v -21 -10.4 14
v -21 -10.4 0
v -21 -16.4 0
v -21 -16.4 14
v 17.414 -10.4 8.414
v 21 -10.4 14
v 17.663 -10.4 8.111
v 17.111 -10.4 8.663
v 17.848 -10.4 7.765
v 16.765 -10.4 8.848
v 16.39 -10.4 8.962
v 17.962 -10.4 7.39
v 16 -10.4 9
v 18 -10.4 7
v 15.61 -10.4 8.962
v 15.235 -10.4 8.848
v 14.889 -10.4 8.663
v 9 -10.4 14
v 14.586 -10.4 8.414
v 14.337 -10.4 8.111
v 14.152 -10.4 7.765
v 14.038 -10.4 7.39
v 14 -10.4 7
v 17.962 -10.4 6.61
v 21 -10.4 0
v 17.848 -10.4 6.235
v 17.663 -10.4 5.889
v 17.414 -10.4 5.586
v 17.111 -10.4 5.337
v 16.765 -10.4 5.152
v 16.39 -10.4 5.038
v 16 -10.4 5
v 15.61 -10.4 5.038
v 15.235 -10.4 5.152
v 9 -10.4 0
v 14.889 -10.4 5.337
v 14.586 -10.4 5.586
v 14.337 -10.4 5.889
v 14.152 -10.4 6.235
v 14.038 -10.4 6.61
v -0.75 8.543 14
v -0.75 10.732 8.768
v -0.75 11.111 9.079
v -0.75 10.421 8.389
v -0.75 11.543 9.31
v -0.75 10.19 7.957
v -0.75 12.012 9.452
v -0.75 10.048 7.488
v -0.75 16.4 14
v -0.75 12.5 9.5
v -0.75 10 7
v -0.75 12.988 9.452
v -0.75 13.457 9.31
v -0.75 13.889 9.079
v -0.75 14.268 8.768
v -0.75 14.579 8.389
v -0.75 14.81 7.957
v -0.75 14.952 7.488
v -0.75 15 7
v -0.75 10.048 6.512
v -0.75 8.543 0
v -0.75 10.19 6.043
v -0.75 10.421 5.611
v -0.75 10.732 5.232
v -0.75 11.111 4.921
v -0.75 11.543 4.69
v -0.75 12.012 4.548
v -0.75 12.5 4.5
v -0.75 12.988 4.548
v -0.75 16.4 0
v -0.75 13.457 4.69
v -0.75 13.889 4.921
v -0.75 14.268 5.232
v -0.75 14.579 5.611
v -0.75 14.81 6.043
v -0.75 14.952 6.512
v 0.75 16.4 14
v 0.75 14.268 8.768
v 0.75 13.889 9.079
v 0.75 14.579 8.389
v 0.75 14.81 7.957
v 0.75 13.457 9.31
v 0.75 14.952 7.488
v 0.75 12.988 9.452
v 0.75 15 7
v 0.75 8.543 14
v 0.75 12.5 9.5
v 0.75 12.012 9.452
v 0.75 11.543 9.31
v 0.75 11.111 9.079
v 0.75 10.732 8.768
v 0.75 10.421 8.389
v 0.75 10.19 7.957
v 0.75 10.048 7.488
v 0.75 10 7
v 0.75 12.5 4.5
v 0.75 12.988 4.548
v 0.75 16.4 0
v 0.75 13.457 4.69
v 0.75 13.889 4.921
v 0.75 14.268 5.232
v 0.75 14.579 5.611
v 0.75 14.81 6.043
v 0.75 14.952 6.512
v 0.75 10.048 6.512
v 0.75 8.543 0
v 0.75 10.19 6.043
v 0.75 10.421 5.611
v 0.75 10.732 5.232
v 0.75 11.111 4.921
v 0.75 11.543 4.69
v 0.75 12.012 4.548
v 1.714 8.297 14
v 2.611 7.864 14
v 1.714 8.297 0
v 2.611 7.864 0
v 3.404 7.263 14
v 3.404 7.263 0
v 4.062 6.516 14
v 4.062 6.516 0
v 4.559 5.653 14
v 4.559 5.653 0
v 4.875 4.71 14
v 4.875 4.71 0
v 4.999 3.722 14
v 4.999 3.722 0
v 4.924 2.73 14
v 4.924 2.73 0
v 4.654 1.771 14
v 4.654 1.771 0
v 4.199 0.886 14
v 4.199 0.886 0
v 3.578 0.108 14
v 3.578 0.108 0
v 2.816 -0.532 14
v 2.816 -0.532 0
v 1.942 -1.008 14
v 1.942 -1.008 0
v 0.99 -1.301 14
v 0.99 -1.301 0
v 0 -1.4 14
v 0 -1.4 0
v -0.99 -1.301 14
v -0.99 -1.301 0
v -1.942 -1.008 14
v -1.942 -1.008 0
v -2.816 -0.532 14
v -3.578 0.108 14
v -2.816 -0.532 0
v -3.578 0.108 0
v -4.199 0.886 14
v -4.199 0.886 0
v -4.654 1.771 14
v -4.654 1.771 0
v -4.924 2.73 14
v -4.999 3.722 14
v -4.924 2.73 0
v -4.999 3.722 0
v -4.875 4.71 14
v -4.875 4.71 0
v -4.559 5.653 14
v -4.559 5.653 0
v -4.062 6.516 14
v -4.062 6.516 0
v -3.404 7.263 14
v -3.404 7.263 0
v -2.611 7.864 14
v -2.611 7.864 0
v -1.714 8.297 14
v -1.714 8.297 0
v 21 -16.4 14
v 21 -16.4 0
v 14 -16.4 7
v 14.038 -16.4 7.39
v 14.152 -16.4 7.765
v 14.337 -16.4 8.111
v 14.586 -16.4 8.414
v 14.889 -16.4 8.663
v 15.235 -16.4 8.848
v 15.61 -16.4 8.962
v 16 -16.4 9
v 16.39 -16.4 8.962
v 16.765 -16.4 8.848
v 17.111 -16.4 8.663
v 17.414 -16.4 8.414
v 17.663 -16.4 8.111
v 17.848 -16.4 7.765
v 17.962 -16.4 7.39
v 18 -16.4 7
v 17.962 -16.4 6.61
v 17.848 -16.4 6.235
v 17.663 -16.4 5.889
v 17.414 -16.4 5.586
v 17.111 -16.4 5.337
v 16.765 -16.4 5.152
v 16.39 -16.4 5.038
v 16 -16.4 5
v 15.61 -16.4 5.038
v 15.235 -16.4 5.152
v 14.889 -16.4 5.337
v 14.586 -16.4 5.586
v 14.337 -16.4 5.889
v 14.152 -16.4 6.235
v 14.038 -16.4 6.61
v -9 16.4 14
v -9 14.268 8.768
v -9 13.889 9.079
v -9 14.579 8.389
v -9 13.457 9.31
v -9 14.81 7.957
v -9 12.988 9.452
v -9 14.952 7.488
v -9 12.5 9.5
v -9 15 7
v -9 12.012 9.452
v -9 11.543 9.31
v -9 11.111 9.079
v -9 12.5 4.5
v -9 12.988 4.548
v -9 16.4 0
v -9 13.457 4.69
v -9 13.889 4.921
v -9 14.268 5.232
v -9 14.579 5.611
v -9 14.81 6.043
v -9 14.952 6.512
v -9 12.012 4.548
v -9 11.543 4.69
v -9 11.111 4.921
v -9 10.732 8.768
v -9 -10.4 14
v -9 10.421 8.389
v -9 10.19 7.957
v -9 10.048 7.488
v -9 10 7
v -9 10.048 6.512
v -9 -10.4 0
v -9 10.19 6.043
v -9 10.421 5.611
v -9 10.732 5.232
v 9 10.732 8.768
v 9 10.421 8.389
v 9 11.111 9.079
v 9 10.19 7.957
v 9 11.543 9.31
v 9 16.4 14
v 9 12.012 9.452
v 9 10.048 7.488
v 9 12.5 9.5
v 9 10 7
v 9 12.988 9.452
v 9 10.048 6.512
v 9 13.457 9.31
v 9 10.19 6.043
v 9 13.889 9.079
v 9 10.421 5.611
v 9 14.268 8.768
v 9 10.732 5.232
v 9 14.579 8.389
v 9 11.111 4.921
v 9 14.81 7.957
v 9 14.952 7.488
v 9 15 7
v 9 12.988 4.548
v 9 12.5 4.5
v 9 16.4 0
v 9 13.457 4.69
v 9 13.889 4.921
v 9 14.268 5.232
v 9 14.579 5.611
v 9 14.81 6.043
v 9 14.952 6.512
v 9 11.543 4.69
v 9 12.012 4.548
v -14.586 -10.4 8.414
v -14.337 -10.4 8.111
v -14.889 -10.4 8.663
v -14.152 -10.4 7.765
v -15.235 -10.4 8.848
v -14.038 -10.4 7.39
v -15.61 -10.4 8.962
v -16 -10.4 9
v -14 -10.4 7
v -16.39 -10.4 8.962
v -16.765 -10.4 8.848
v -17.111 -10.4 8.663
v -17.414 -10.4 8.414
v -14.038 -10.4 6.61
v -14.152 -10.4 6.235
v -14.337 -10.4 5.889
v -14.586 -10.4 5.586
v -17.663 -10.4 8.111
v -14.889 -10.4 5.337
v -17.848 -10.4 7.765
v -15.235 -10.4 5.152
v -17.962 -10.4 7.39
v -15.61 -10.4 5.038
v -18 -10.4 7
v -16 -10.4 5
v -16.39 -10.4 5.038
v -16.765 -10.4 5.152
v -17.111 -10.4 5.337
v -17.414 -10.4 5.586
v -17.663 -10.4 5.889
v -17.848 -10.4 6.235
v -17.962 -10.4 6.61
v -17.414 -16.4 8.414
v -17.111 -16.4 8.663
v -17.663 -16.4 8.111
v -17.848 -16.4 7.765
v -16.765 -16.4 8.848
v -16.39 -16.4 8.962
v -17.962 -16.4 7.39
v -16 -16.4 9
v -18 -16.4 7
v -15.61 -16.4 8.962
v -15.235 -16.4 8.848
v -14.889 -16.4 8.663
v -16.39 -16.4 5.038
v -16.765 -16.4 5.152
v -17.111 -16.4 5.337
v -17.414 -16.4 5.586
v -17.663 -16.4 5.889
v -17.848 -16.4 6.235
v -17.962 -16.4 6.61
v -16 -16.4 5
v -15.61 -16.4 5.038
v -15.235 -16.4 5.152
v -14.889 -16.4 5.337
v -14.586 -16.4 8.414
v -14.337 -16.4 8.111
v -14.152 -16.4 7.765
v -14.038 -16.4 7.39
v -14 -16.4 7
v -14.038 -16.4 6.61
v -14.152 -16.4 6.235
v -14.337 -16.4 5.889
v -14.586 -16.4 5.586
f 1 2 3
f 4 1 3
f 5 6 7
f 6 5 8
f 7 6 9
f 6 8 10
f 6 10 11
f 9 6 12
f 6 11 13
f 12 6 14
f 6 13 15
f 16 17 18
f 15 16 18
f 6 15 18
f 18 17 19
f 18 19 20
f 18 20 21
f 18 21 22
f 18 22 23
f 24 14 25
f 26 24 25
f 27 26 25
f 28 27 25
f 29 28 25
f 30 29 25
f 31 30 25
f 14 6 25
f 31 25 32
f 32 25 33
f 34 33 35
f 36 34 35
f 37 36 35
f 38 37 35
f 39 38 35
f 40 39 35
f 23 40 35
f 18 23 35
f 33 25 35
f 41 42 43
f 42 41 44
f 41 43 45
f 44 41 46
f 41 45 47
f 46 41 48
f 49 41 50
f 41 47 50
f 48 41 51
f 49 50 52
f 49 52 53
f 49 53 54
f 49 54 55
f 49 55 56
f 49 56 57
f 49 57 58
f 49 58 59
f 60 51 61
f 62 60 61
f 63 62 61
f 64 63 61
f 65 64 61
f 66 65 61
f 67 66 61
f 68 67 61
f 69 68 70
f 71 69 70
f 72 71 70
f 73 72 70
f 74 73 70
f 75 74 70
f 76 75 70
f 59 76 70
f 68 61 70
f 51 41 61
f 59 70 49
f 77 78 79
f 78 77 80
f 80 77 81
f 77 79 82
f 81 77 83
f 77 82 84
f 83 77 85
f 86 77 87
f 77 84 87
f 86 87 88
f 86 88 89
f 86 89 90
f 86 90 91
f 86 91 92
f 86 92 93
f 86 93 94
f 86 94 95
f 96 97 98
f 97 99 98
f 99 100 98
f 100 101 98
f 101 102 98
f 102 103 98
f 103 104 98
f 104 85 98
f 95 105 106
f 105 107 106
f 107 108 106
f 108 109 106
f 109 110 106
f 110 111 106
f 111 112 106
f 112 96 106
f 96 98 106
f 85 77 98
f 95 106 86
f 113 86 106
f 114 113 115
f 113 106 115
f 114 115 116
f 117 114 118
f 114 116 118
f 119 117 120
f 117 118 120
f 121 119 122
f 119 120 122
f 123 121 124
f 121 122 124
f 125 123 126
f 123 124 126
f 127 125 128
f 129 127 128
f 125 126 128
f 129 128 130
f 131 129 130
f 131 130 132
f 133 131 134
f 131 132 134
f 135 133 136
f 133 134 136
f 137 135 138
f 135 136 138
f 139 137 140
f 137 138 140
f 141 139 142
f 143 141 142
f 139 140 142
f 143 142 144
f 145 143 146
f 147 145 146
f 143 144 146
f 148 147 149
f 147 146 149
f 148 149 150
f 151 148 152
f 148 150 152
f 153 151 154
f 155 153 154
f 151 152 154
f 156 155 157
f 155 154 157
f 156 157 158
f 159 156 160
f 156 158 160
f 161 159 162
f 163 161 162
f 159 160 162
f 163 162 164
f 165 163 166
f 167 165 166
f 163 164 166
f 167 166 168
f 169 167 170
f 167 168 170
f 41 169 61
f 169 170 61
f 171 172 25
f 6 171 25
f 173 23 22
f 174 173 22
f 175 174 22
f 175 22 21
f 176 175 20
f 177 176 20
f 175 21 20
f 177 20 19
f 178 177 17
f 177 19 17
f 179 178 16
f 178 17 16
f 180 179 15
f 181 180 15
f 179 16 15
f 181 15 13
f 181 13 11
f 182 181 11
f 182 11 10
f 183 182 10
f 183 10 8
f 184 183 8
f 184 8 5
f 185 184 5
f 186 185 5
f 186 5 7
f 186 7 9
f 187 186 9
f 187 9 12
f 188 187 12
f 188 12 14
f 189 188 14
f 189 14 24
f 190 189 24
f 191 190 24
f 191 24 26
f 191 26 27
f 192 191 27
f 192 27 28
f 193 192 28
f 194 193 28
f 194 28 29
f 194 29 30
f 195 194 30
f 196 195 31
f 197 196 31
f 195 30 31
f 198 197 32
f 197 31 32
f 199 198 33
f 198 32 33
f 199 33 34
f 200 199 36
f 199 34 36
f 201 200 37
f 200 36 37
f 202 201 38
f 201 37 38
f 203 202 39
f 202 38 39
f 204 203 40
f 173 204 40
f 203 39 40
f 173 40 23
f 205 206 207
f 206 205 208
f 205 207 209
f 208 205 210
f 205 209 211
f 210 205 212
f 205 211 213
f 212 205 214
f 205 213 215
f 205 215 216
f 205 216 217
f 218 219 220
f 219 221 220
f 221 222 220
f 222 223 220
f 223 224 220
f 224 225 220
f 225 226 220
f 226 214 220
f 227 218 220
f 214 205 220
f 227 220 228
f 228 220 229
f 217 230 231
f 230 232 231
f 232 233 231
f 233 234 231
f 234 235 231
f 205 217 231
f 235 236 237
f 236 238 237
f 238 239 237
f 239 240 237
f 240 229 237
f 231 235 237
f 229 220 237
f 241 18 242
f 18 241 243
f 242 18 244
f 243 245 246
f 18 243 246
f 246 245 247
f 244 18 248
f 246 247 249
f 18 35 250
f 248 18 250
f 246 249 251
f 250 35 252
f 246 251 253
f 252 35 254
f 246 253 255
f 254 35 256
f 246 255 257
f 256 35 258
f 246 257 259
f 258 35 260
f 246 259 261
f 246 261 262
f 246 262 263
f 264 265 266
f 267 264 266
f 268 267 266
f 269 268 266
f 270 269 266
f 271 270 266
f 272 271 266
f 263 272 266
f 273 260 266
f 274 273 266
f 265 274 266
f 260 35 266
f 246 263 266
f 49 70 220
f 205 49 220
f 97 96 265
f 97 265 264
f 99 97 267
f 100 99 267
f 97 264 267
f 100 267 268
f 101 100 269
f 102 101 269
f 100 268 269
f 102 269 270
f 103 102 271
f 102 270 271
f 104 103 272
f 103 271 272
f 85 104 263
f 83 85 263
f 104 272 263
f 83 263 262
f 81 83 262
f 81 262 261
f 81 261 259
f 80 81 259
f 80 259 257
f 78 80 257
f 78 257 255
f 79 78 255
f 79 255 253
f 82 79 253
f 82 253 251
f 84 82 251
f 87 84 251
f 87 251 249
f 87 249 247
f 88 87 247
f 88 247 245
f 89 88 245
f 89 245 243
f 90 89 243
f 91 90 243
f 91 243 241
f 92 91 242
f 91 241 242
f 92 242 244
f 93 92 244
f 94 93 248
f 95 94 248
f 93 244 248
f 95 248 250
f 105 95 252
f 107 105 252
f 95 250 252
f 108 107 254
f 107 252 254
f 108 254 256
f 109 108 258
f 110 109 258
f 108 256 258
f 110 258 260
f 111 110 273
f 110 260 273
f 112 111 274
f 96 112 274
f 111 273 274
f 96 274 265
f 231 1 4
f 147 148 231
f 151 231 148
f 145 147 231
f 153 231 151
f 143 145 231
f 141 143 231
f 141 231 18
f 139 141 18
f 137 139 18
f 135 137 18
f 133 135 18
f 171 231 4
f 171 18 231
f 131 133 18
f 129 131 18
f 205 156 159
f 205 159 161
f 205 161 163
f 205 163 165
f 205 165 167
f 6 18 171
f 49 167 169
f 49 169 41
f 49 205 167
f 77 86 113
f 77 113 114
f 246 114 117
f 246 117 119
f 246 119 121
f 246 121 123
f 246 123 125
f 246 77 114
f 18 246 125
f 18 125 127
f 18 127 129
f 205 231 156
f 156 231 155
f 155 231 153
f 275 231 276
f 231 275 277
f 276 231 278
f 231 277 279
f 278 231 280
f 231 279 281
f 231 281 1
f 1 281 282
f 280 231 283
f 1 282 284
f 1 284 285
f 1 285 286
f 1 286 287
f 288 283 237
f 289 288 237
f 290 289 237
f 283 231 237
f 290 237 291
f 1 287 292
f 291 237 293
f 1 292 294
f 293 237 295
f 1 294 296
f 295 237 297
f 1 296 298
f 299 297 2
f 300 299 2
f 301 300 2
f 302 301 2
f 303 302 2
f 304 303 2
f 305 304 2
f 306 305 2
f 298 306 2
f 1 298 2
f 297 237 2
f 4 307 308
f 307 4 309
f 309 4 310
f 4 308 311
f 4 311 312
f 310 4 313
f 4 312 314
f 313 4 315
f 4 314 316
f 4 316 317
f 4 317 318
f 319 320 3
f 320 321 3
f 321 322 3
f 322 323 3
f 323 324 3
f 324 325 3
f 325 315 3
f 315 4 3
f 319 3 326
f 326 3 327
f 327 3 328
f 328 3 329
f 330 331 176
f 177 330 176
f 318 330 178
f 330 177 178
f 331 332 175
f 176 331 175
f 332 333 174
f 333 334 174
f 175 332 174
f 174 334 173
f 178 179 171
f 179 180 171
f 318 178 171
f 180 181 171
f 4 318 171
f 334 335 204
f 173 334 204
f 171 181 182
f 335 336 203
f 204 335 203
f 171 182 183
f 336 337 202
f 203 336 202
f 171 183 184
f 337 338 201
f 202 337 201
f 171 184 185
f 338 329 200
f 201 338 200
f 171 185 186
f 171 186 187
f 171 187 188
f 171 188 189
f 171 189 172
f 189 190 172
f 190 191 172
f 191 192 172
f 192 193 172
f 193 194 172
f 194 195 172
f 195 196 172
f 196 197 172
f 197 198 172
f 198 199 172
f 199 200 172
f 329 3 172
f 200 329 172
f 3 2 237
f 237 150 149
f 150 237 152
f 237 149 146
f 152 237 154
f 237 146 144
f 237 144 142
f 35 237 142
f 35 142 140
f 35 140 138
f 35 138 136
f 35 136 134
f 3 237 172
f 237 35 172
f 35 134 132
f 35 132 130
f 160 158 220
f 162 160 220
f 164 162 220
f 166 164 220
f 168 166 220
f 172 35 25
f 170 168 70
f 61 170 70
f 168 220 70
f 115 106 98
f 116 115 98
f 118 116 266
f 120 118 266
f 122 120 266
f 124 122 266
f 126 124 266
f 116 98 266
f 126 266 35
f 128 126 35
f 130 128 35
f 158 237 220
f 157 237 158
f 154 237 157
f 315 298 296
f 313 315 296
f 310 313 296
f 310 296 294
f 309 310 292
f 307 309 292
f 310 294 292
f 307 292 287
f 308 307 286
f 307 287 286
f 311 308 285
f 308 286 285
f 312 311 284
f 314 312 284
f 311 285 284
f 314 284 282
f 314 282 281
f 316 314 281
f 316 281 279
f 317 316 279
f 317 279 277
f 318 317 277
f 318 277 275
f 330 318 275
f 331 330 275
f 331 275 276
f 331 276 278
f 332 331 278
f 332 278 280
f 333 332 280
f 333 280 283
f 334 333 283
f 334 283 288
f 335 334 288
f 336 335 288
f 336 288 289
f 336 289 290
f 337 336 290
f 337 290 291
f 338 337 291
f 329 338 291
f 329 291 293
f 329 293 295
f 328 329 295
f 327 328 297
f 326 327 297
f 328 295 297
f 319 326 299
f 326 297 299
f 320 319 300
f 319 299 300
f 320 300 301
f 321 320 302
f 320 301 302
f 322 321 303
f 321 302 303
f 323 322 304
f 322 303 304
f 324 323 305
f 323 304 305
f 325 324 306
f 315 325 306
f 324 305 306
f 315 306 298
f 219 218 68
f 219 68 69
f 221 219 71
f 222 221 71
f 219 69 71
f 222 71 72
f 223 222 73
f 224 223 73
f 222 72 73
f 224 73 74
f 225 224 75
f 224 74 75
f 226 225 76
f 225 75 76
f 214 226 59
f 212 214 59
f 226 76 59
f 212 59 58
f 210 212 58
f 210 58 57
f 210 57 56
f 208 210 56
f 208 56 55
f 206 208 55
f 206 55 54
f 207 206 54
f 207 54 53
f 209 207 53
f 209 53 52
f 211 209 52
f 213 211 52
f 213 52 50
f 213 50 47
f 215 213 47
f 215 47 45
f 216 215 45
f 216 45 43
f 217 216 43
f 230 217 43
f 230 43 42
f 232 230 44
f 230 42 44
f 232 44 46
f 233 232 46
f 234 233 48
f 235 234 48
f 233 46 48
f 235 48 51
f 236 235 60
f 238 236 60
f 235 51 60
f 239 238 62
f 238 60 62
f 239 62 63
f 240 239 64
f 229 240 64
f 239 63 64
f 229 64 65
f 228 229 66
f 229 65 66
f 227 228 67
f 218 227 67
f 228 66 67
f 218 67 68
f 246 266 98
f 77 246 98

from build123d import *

# Parameters (mm, degrees)
BOSS_EXTRUDE1_DEPTH = 14
SKETCH2_R           = 2.5
CUT_EXTRUDE1_DEPTH  = 37.945365068
SKETCH3_R           = 2
CUT_EXTRUDE2_DEPTH  = 14


with BuildPart() as part:
    # Sketch1 → Boss-Extrude1 (new body)
    with BuildSketch(Plane.XY):
        with BuildLine():
            Line((-21, -16.4), (21, -16.4))
            Line((21, -16.4), (21, -10.4))
            Line((21, -10.4), (9, -10.4))
            Line((9, -10.4), (9, 16.4))
            Line((9, 16.4), (0.75, 16.4))
            Line((0.75, 16.4), (0.75, 8.543429983))
            ThreePointArc((0.75, 8.543429983), (0, -1.4), (-0.75, 8.543429983))
            Line((-0.75, 8.543429983), (-0.75, 16.4))
            Line((-0.75, 16.4), (-9, 16.4))
            Line((-9, 16.4), (-9, -10.4))
            Line((-9, -10.4), (-21, -10.4))
            Line((-21, -10.4), (-21, -16.4))
        make_face()
    extrude(amount=BOSS_EXTRUDE1_DEPTH)

    # Sketch2 → Cut-Extrude1 (cut, through all)
    with BuildSketch(Plane(origin=(9, 0, 0), x_dir=(0, 0, -1), z_dir=(1, 0, 0))):
        with Locations((-7, 12.5)):
            Circle(SKETCH2_R)
    extrude(amount=-CUT_EXTRUDE1_DEPTH, mode=Mode.SUBTRACT)

    # Sketch3 → Cut-Extrude2 (cut)
    with BuildSketch(Plane(origin=(0, -10.4, 0), x_dir=(1, 0, 0), z_dir=(0, 1, 0))):
        with Locations(Location((-16, -7, 0), (0, 0, 180))):
            Circle(SKETCH3_R)
        with Locations(Location((16, -7, 0), (0, 0, 180))):
            Circle(SKETCH3_R)
    extrude(amount=-CUT_EXTRUDE2_DEPTH, mode=Mode.SUBTRACT)


solid = part.part
